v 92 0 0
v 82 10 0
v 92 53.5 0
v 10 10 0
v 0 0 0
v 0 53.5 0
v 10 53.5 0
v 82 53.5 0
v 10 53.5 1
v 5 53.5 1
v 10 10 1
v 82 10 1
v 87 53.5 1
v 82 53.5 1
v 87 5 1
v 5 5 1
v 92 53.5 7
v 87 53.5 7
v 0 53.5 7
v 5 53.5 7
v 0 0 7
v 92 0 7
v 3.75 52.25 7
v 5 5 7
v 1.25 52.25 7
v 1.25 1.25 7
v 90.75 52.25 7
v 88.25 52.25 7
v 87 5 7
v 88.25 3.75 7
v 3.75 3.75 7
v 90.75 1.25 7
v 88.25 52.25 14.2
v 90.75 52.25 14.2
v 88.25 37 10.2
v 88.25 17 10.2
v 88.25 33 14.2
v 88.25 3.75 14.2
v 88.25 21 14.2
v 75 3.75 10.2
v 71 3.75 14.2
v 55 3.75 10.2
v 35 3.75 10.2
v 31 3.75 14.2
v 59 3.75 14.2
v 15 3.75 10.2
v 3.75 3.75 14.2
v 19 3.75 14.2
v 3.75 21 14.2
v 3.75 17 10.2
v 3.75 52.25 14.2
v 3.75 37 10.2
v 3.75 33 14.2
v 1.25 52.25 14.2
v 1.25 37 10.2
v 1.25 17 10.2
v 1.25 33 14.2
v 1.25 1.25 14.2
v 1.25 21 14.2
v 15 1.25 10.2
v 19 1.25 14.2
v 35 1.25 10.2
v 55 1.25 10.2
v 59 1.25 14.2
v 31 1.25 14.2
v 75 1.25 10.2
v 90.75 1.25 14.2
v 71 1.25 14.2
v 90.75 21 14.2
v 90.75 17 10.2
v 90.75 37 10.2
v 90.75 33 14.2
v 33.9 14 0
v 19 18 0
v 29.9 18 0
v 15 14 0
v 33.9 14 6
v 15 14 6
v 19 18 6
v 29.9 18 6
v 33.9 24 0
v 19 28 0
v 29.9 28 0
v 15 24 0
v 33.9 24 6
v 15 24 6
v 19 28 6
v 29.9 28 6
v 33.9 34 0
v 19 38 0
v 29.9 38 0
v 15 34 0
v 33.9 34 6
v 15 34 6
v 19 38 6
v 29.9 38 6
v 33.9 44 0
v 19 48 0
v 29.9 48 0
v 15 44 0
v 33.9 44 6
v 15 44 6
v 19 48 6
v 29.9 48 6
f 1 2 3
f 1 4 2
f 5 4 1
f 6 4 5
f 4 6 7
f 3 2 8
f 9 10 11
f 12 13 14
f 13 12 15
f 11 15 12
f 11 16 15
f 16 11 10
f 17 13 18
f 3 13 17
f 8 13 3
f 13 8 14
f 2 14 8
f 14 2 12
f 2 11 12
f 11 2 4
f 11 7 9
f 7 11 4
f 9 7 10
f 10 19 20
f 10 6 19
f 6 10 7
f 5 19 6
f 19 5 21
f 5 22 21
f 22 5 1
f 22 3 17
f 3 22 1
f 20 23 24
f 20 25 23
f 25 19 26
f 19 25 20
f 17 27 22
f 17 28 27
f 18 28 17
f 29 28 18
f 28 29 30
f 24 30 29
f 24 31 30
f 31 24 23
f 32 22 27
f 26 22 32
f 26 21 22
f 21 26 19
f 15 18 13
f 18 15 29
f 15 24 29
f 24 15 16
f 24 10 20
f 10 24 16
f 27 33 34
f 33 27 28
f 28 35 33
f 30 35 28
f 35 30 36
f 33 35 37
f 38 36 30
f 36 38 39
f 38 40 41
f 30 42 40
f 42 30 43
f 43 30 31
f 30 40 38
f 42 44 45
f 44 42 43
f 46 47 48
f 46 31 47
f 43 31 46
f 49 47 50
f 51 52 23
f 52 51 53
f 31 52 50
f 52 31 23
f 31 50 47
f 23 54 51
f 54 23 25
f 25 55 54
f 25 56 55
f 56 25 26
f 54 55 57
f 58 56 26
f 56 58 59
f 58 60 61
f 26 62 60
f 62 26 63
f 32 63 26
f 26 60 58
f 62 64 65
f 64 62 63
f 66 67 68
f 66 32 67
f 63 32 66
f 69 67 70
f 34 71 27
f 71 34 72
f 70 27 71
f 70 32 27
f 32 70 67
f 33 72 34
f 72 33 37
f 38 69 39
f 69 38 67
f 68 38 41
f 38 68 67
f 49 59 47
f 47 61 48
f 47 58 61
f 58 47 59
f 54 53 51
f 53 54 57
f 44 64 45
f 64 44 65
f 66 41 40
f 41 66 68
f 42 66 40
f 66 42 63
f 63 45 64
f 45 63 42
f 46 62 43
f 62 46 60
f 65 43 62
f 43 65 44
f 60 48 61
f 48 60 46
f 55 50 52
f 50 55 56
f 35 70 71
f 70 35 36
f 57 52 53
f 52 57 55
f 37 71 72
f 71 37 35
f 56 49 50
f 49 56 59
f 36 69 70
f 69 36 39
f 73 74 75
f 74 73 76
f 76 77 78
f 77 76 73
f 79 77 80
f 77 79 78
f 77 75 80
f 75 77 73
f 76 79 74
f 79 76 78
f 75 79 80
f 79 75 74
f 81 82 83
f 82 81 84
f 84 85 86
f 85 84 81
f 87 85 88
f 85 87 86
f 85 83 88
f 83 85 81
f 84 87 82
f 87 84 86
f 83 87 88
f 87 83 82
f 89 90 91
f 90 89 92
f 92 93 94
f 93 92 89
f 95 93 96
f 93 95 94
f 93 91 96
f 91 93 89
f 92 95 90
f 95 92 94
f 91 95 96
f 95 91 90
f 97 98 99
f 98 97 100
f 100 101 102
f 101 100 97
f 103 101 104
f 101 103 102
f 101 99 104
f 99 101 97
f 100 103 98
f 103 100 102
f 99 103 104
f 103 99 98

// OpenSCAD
//the u-shaped base
outerUWidth = 92;
outerUHeight = 53.5;

baseWidth = 5;
slotWidth = 6;

frontThickness = 1;
frontWidth = 10;

tabHeight = 3.2;
tabWidth = 2.5;

backingHeight = 4;
backingWidth = 2.5;

triangleWidth = 20;


//uHeight - the height of the u-shape.
//uWidth - the thickness of the u-shape.
module drawU(uHeight, uWidth, modOuterUWidth, modOuterUHeight){
    linear_extrude(height=uHeight)
    polygon([[0,0],[modOuterUWidth, 0],[modOuterUWidth, modOuterUHeight],[modOuterUWidth-uWidth, modOuterUHeight],[modOuterUWidth-uWidth, uWidth],[uWidth, uWidth],[uWidth, modOuterUHeight],[0, modOuterUHeight]]);
    }
    
module drawTriangle(xOffset, xRotate, zRotate){
    triangleHeight = frontThickness + slotWidth + tabHeight;
    rotate([xRotate, 0, zRotate])
    linear_extrude(height = 400)
    polygon([[xOffset, triangleHeight],[xOffset+triangleWidth, triangleHeight],[xOffset+triangleWidth/2,triangleHeight+triangleWidth/2]]);
    }
    
module drawPin(){
    difference(){
        linear_extrude(height = 6)
        polygon([[0,0],[triangleWidth-1.1,0],[(triangleWidth-1.1)/2, (triangleWidth-1.1)/2]]);
        translate([0,4,-1])
        linear_extrude(height=8)
        square(triangleWidth, false);
        }
    }

module drawAllU(){
    drawU(frontThickness, frontWidth, outerUWidth, outerUHeight);
    
    //the part that touches the outside front  
    translate([0,0,frontThickness])
    drawU(slotWidth, baseWidth, outerUWidth, outerUHeight);
    
    translate([tabWidth/2,tabWidth/2,frontThickness + slotWidth])
    drawU(tabHeight, tabWidth, outerUWidth-tabWidth, outerUHeight-tabWidth);
    
    translate([tabWidth/2,tabWidth/2,frontThickness+slotWidth+tabHeight])
    drawU(backingHeight, backingWidth, outerUWidth-backingWidth, outerUHeight-backingWidth); 
    }


difference(){
drawAllU();
translate([0,50,0])
drawTriangle(55, 90, 0); 
translate([0,50,0])
drawTriangle(15, 90, 0);  
drawTriangle(17, 90, 90);   
}

translate([15,14,0])
drawPin();
translate([15,24,0])
drawPin();
translate([15,34,0])
drawPin();
translate([15,44,0])
drawPin();
  
    
